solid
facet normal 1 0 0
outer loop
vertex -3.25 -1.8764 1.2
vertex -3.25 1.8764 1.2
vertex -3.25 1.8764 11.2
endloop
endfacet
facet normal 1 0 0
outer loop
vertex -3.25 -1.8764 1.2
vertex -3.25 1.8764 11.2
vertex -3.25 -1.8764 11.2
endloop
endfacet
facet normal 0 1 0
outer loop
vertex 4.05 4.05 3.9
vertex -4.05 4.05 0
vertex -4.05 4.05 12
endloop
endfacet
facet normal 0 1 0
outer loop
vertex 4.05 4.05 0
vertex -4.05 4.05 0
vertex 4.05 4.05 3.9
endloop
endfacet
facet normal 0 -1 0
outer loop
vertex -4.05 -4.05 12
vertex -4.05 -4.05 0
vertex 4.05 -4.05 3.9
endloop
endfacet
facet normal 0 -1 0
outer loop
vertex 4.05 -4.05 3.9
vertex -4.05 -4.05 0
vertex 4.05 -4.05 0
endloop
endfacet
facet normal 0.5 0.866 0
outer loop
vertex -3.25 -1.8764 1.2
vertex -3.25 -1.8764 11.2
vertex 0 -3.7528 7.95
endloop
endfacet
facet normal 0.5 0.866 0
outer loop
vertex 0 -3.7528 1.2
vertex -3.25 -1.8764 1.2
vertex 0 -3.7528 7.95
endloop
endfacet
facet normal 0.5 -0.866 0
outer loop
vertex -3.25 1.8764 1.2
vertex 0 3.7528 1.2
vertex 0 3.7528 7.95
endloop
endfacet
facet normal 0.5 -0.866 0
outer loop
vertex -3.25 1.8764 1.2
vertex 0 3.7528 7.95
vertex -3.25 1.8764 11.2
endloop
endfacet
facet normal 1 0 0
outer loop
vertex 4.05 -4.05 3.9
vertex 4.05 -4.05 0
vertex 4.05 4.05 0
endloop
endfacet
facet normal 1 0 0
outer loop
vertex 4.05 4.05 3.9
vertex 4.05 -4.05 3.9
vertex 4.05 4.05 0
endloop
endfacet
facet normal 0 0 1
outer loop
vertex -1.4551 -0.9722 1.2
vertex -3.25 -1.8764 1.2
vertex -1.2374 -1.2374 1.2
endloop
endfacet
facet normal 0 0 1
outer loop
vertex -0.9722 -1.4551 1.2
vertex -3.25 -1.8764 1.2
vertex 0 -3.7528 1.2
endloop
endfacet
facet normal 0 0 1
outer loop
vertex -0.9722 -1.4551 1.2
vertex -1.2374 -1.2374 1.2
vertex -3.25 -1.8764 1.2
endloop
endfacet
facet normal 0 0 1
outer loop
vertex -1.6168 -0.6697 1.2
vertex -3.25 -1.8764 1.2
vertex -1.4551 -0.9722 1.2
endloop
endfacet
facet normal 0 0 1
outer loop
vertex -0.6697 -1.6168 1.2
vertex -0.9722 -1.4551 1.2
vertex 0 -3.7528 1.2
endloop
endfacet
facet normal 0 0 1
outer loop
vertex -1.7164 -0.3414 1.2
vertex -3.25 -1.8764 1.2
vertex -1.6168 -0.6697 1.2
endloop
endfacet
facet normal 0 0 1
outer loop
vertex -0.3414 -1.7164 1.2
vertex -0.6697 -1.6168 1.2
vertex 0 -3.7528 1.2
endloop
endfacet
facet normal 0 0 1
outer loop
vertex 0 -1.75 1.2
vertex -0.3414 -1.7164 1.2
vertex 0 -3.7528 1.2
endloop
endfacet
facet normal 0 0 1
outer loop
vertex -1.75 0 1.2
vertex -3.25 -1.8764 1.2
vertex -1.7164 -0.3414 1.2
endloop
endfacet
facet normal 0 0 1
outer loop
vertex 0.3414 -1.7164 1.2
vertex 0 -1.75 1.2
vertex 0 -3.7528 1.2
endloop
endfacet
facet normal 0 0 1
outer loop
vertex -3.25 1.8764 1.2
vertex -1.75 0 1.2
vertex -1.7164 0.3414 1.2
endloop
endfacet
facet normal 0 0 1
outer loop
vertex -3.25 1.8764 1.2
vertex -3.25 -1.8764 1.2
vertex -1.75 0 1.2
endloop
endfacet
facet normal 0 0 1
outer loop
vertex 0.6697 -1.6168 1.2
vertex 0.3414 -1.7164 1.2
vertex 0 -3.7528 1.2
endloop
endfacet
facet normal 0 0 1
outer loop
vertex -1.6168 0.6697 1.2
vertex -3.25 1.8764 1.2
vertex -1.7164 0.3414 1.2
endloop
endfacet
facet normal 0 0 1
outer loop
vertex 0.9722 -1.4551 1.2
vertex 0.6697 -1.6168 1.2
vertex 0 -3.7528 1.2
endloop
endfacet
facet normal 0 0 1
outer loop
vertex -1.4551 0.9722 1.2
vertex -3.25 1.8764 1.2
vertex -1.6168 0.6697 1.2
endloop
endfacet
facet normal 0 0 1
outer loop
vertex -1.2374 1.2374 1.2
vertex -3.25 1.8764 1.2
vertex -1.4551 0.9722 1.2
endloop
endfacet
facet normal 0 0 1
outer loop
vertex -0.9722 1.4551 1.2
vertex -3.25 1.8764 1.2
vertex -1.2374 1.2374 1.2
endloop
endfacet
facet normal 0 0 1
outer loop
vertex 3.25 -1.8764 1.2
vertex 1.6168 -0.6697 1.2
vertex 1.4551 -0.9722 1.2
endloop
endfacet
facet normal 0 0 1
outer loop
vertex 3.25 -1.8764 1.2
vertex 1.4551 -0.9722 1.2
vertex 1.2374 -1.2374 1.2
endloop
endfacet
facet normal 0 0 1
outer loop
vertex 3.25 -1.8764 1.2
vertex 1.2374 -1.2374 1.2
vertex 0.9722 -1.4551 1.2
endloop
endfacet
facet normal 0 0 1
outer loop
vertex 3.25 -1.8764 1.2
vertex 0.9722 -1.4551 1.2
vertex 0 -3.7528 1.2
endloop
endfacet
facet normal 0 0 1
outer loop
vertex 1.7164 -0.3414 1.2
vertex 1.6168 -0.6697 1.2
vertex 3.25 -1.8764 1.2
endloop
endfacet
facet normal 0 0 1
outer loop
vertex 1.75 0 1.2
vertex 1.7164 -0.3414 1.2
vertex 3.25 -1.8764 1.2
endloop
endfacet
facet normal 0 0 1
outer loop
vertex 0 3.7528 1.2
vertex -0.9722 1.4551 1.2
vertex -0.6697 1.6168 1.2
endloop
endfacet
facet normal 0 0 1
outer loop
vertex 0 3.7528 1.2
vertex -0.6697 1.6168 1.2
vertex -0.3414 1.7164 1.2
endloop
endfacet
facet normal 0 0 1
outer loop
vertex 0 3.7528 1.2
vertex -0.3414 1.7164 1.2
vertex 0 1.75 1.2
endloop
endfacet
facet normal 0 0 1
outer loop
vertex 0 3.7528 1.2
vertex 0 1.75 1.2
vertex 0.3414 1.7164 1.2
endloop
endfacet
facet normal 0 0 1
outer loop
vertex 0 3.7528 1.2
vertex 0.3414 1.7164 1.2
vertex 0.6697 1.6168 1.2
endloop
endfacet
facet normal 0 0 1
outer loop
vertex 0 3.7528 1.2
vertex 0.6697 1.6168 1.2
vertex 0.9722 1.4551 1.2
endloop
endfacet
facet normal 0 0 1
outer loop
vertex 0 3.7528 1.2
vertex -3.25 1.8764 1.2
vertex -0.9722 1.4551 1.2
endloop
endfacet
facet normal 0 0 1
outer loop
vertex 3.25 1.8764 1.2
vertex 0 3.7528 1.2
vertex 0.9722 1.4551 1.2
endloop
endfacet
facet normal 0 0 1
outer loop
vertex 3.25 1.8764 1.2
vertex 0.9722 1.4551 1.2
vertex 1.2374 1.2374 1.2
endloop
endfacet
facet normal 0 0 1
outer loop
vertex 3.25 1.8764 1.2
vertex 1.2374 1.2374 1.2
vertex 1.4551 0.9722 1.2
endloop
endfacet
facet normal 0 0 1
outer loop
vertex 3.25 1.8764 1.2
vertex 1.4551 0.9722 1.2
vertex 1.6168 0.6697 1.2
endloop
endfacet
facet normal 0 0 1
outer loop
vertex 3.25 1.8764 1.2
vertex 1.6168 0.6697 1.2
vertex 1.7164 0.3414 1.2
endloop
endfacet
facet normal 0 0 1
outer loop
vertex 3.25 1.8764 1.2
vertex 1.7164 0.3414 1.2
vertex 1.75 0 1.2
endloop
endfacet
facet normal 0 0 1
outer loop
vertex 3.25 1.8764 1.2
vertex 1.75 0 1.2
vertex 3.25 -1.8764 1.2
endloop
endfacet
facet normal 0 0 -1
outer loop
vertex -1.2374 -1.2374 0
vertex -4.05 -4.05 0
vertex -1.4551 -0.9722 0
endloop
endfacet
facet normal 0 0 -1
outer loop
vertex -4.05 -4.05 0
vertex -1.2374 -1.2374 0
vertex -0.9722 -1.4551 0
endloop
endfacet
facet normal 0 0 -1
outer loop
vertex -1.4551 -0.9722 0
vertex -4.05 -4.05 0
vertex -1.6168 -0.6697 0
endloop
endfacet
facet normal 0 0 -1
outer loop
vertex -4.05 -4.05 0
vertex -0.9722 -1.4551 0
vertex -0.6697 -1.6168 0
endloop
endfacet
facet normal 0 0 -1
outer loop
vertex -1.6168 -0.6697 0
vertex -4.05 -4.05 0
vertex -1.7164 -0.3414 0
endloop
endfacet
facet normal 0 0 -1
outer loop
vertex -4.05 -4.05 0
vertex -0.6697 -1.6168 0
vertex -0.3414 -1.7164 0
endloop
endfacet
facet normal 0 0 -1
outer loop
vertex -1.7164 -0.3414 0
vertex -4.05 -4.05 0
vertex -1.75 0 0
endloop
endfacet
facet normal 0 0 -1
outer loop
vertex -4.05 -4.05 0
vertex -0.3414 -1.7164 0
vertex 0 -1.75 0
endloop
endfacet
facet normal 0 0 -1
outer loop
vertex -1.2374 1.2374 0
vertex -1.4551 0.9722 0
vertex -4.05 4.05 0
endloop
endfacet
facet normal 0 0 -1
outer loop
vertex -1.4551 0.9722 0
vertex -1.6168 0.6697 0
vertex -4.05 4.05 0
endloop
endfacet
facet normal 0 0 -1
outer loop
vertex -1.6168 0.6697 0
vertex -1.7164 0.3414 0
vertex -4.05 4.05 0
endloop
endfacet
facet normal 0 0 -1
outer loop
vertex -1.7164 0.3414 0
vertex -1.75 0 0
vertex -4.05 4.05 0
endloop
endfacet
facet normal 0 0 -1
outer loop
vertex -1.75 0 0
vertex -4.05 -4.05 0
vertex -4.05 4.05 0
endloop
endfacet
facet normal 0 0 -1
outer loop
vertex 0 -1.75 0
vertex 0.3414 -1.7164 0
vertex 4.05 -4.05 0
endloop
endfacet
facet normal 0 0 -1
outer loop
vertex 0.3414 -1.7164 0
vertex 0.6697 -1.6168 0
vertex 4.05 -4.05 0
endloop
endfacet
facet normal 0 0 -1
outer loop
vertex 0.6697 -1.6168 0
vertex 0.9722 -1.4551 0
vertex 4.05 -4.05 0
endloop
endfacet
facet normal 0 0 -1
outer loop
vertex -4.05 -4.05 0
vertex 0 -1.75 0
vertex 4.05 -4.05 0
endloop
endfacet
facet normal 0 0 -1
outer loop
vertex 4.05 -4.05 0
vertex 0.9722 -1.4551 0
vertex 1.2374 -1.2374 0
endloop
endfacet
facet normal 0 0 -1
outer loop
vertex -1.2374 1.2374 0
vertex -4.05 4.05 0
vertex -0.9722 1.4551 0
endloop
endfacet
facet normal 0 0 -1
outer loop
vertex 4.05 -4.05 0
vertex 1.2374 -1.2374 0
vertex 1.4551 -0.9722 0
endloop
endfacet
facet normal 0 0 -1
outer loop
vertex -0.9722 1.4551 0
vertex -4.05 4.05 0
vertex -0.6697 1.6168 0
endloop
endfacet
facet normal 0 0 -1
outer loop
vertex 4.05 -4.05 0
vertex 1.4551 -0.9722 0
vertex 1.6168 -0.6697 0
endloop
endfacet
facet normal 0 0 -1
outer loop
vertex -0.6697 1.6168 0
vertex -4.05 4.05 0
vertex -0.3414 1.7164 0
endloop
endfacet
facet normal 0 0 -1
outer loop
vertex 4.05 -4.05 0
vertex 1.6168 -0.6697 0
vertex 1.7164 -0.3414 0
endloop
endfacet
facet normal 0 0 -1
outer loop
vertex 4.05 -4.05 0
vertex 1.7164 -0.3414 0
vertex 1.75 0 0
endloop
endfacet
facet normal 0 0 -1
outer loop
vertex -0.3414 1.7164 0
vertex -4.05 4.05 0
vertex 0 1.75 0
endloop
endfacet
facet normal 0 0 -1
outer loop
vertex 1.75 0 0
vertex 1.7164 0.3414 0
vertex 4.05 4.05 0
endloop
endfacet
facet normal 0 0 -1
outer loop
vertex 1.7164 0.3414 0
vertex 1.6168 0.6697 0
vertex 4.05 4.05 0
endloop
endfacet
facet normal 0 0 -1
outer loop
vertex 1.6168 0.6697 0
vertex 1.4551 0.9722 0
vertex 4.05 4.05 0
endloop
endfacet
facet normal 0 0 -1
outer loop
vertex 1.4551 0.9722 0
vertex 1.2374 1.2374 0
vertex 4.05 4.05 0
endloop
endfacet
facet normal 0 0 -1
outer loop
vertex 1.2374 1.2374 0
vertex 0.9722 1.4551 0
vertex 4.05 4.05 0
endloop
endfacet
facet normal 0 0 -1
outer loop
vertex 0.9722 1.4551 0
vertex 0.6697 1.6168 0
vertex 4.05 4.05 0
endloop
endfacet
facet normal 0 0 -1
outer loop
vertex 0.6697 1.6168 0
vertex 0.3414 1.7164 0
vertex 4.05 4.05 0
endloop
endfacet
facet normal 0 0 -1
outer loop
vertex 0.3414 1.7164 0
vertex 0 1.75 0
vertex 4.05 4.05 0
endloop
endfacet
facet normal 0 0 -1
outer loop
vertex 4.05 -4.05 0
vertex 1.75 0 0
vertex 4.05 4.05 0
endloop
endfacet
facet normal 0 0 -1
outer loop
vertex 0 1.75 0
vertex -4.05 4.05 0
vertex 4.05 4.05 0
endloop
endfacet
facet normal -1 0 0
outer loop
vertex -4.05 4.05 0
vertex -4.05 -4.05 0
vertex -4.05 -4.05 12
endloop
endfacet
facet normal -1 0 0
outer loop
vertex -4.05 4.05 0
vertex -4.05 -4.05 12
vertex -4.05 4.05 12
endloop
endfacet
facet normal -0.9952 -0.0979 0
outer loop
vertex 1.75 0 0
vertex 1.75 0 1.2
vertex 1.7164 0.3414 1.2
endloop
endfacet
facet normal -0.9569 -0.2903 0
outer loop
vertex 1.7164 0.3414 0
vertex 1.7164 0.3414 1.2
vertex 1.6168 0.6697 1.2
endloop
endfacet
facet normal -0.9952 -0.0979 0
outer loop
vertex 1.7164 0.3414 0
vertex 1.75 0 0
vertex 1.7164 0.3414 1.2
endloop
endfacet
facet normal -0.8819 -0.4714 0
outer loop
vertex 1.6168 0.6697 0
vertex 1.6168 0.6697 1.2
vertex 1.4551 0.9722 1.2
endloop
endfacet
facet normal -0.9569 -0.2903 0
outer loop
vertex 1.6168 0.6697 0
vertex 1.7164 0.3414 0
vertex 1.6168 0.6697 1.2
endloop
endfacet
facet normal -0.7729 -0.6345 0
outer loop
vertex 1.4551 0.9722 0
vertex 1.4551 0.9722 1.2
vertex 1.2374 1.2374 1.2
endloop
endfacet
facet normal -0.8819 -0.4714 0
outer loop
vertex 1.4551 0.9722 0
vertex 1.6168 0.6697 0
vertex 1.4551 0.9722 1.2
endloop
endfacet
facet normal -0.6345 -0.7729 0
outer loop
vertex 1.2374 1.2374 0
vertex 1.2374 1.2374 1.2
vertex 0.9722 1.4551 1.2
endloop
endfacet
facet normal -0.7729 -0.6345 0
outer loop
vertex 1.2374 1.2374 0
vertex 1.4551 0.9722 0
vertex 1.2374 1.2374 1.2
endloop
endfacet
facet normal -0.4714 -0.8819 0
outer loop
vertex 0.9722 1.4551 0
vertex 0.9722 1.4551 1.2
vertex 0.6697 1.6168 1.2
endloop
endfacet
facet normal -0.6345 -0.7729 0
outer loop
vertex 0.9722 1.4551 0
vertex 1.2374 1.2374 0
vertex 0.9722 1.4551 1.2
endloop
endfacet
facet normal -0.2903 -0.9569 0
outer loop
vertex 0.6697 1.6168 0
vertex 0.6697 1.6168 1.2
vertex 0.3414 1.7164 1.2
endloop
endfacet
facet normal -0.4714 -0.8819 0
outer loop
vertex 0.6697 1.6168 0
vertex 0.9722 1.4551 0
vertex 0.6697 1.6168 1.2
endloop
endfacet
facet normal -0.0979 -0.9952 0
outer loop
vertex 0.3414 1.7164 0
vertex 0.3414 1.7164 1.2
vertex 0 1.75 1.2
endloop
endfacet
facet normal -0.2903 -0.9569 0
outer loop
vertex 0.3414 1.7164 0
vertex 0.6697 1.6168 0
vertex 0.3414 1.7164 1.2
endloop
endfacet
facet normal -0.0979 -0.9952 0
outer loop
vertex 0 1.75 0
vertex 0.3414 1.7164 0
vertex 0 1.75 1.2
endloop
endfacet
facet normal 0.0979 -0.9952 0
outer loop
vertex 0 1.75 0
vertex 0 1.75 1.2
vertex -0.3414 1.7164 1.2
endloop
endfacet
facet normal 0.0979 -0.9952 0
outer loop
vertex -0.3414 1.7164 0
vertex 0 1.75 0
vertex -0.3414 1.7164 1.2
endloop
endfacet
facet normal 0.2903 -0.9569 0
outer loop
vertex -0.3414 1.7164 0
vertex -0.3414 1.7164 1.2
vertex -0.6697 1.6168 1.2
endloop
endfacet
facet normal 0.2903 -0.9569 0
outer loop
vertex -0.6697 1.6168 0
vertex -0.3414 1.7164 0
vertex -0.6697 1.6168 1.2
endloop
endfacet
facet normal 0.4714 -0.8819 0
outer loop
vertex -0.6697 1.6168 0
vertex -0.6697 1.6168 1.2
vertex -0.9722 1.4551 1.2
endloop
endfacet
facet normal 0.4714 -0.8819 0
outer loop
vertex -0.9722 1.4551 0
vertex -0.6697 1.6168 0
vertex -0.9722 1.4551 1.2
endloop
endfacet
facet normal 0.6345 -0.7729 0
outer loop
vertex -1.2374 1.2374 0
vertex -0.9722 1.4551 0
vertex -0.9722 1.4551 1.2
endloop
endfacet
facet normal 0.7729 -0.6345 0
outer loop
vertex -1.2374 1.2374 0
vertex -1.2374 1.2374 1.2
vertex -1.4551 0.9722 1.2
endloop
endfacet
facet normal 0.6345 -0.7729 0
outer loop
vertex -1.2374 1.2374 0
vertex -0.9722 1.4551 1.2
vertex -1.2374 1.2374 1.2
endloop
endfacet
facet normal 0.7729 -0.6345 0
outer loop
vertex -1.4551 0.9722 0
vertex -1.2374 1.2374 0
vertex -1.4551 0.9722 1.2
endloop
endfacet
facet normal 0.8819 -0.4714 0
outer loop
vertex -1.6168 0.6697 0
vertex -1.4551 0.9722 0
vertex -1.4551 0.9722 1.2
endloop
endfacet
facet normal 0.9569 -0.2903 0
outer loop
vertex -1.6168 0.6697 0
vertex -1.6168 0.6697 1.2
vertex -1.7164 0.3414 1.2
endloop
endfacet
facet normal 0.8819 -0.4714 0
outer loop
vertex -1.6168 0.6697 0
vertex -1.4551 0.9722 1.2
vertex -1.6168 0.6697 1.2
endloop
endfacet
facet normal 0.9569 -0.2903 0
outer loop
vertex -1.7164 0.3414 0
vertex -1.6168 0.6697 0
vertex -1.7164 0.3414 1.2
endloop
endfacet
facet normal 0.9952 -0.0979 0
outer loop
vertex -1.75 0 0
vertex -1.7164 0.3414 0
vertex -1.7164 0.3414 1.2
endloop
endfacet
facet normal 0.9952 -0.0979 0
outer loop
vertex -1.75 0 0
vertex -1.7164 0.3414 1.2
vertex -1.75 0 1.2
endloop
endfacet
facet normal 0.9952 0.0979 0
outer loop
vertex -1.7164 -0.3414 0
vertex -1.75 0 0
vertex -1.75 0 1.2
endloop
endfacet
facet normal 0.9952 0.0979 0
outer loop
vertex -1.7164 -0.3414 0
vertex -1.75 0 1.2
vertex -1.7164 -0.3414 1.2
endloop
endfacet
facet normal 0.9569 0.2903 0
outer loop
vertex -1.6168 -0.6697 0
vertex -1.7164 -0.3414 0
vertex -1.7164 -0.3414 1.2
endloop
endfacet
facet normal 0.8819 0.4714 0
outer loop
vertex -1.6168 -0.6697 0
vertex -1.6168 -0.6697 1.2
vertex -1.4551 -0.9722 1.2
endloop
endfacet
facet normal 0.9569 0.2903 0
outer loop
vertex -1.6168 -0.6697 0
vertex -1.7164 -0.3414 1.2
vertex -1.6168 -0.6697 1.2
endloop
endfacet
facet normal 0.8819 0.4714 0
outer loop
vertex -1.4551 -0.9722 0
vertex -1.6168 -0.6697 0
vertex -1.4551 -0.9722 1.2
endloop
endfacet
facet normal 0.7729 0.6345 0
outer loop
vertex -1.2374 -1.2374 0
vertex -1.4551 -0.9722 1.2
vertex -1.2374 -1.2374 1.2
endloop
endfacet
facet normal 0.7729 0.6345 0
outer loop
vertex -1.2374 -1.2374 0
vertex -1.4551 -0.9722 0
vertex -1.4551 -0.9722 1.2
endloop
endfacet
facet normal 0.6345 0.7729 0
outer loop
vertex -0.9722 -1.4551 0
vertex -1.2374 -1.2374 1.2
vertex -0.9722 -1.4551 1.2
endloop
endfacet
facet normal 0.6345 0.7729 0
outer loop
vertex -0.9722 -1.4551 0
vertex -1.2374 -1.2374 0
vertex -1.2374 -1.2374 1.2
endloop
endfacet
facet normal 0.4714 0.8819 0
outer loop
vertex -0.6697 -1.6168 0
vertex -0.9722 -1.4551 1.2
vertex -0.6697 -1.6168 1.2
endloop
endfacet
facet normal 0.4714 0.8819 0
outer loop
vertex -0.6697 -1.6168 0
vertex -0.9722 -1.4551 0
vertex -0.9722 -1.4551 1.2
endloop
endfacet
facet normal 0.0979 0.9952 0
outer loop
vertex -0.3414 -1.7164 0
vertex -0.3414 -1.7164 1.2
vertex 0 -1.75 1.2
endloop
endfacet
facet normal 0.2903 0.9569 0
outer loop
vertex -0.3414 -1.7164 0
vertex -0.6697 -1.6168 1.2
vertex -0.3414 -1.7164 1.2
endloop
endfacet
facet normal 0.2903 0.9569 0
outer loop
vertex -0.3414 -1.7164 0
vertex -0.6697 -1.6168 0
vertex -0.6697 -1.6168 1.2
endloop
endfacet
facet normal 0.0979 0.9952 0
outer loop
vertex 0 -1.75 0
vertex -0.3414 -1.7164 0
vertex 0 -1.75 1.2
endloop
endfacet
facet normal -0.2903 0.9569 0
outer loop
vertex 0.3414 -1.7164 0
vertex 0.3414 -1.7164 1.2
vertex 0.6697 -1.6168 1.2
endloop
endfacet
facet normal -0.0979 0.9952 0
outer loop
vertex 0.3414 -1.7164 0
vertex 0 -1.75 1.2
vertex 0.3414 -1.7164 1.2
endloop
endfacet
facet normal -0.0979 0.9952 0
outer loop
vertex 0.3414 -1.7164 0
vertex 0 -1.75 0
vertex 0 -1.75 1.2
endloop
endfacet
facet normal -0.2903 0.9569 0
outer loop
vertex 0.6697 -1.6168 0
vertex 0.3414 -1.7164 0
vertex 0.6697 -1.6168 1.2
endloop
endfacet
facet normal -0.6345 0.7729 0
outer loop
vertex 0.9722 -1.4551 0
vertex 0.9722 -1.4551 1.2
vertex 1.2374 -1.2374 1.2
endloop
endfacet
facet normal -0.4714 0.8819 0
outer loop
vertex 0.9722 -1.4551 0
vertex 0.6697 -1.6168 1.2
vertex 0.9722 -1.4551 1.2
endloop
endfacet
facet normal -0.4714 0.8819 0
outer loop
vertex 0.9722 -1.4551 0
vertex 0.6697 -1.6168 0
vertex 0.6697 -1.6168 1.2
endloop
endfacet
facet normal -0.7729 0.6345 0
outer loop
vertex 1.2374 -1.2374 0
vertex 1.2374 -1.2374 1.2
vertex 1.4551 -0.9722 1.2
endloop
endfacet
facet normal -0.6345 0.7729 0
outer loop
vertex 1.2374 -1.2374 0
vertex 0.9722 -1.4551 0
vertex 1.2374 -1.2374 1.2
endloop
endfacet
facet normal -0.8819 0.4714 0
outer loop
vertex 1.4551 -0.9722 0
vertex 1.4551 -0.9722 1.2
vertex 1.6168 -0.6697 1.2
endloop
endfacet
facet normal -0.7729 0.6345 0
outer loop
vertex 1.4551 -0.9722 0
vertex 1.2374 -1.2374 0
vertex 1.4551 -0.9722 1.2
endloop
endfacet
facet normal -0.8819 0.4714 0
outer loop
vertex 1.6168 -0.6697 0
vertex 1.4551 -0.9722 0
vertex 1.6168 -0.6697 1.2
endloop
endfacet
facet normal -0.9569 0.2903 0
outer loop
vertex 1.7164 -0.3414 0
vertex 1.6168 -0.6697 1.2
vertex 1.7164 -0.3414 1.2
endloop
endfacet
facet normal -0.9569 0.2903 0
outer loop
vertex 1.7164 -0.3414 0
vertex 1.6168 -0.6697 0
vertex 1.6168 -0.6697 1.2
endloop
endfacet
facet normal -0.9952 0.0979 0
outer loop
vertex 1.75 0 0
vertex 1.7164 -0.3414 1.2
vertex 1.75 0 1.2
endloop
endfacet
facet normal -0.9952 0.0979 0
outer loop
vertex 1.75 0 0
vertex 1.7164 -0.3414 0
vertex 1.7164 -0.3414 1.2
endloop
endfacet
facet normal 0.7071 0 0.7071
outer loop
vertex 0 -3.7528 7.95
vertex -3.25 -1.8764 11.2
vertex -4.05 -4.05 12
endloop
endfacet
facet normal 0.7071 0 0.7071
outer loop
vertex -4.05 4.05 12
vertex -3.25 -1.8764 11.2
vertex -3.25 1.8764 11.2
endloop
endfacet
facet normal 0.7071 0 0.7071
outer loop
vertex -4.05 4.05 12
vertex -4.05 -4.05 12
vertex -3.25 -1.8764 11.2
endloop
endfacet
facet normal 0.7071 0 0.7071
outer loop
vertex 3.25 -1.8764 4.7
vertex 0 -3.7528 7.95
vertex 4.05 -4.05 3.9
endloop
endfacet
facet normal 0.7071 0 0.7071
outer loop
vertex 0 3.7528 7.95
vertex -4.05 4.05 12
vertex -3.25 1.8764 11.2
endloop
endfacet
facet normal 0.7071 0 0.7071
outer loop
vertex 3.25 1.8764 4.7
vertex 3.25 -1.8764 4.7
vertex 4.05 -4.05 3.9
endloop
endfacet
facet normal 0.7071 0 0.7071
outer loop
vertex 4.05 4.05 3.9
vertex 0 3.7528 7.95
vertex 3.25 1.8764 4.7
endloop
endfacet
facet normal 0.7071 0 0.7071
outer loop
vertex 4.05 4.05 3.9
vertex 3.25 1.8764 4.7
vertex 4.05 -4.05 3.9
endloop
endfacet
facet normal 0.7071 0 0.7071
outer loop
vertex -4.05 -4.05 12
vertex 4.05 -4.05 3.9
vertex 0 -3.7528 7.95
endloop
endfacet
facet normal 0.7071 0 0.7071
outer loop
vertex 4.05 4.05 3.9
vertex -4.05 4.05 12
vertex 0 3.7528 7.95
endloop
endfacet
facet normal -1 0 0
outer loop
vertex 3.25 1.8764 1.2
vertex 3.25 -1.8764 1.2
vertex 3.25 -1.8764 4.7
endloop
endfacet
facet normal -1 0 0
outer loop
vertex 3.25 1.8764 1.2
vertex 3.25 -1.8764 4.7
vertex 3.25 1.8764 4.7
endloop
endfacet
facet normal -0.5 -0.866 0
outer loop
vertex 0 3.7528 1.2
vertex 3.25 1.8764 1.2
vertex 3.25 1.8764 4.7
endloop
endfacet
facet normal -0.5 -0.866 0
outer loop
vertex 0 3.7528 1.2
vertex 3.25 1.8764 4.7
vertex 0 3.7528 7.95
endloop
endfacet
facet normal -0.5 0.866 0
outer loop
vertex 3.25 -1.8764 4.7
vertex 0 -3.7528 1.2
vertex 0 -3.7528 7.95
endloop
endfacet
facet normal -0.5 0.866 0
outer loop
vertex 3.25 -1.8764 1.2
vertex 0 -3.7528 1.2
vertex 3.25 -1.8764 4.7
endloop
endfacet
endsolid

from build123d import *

# Parameters (mm, degrees)
SKETCH_W             = 8.1
SKETCH_H             = 8.1
SKETCH_R             = 1.75
PAD_DEPTH            = 12
POCKET_DEPTH         = 10.801
POCKET001_DEPTH      = 4.051
POCKET001_DEPTH_BACK = -4.051


with BuildPart() as part:
    # Sketch → Pad (new body)
    with BuildSketch(Plane.XY):
        Rectangle(SKETCH_W, SKETCH_H)
        Circle(SKETCH_R, mode=Mode.SUBTRACT)
    extrude(amount=PAD_DEPTH)

    # Sketch001 → Pocket (cut, through all)
    with BuildSketch(Plane.XY.offset(1.2)):
        Polygon((0, 3.752777), (-3.25, 1.876388), (-3.25, -1.876388), (0, -3.752777), (3.25, -1.876388), (3.25, 1.876388), align=None)
    extrude(amount=POCKET_DEPTH, mode=Mode.SUBTRACT)

    # Sketch002 → Pocket001 (cut, two sides)
    with BuildSketch(Plane.XZ) as pocket001_sk:
        Polygon((4.05, 12), (-4.05, 12), (4.05, 3.9), align=None)
    extrude(amount=-POCKET001_DEPTH, mode=Mode.SUBTRACT)
    extrude(pocket001_sk.sketch, amount=-POCKET001_DEPTH_BACK, mode=Mode.SUBTRACT)


solid = part.part
